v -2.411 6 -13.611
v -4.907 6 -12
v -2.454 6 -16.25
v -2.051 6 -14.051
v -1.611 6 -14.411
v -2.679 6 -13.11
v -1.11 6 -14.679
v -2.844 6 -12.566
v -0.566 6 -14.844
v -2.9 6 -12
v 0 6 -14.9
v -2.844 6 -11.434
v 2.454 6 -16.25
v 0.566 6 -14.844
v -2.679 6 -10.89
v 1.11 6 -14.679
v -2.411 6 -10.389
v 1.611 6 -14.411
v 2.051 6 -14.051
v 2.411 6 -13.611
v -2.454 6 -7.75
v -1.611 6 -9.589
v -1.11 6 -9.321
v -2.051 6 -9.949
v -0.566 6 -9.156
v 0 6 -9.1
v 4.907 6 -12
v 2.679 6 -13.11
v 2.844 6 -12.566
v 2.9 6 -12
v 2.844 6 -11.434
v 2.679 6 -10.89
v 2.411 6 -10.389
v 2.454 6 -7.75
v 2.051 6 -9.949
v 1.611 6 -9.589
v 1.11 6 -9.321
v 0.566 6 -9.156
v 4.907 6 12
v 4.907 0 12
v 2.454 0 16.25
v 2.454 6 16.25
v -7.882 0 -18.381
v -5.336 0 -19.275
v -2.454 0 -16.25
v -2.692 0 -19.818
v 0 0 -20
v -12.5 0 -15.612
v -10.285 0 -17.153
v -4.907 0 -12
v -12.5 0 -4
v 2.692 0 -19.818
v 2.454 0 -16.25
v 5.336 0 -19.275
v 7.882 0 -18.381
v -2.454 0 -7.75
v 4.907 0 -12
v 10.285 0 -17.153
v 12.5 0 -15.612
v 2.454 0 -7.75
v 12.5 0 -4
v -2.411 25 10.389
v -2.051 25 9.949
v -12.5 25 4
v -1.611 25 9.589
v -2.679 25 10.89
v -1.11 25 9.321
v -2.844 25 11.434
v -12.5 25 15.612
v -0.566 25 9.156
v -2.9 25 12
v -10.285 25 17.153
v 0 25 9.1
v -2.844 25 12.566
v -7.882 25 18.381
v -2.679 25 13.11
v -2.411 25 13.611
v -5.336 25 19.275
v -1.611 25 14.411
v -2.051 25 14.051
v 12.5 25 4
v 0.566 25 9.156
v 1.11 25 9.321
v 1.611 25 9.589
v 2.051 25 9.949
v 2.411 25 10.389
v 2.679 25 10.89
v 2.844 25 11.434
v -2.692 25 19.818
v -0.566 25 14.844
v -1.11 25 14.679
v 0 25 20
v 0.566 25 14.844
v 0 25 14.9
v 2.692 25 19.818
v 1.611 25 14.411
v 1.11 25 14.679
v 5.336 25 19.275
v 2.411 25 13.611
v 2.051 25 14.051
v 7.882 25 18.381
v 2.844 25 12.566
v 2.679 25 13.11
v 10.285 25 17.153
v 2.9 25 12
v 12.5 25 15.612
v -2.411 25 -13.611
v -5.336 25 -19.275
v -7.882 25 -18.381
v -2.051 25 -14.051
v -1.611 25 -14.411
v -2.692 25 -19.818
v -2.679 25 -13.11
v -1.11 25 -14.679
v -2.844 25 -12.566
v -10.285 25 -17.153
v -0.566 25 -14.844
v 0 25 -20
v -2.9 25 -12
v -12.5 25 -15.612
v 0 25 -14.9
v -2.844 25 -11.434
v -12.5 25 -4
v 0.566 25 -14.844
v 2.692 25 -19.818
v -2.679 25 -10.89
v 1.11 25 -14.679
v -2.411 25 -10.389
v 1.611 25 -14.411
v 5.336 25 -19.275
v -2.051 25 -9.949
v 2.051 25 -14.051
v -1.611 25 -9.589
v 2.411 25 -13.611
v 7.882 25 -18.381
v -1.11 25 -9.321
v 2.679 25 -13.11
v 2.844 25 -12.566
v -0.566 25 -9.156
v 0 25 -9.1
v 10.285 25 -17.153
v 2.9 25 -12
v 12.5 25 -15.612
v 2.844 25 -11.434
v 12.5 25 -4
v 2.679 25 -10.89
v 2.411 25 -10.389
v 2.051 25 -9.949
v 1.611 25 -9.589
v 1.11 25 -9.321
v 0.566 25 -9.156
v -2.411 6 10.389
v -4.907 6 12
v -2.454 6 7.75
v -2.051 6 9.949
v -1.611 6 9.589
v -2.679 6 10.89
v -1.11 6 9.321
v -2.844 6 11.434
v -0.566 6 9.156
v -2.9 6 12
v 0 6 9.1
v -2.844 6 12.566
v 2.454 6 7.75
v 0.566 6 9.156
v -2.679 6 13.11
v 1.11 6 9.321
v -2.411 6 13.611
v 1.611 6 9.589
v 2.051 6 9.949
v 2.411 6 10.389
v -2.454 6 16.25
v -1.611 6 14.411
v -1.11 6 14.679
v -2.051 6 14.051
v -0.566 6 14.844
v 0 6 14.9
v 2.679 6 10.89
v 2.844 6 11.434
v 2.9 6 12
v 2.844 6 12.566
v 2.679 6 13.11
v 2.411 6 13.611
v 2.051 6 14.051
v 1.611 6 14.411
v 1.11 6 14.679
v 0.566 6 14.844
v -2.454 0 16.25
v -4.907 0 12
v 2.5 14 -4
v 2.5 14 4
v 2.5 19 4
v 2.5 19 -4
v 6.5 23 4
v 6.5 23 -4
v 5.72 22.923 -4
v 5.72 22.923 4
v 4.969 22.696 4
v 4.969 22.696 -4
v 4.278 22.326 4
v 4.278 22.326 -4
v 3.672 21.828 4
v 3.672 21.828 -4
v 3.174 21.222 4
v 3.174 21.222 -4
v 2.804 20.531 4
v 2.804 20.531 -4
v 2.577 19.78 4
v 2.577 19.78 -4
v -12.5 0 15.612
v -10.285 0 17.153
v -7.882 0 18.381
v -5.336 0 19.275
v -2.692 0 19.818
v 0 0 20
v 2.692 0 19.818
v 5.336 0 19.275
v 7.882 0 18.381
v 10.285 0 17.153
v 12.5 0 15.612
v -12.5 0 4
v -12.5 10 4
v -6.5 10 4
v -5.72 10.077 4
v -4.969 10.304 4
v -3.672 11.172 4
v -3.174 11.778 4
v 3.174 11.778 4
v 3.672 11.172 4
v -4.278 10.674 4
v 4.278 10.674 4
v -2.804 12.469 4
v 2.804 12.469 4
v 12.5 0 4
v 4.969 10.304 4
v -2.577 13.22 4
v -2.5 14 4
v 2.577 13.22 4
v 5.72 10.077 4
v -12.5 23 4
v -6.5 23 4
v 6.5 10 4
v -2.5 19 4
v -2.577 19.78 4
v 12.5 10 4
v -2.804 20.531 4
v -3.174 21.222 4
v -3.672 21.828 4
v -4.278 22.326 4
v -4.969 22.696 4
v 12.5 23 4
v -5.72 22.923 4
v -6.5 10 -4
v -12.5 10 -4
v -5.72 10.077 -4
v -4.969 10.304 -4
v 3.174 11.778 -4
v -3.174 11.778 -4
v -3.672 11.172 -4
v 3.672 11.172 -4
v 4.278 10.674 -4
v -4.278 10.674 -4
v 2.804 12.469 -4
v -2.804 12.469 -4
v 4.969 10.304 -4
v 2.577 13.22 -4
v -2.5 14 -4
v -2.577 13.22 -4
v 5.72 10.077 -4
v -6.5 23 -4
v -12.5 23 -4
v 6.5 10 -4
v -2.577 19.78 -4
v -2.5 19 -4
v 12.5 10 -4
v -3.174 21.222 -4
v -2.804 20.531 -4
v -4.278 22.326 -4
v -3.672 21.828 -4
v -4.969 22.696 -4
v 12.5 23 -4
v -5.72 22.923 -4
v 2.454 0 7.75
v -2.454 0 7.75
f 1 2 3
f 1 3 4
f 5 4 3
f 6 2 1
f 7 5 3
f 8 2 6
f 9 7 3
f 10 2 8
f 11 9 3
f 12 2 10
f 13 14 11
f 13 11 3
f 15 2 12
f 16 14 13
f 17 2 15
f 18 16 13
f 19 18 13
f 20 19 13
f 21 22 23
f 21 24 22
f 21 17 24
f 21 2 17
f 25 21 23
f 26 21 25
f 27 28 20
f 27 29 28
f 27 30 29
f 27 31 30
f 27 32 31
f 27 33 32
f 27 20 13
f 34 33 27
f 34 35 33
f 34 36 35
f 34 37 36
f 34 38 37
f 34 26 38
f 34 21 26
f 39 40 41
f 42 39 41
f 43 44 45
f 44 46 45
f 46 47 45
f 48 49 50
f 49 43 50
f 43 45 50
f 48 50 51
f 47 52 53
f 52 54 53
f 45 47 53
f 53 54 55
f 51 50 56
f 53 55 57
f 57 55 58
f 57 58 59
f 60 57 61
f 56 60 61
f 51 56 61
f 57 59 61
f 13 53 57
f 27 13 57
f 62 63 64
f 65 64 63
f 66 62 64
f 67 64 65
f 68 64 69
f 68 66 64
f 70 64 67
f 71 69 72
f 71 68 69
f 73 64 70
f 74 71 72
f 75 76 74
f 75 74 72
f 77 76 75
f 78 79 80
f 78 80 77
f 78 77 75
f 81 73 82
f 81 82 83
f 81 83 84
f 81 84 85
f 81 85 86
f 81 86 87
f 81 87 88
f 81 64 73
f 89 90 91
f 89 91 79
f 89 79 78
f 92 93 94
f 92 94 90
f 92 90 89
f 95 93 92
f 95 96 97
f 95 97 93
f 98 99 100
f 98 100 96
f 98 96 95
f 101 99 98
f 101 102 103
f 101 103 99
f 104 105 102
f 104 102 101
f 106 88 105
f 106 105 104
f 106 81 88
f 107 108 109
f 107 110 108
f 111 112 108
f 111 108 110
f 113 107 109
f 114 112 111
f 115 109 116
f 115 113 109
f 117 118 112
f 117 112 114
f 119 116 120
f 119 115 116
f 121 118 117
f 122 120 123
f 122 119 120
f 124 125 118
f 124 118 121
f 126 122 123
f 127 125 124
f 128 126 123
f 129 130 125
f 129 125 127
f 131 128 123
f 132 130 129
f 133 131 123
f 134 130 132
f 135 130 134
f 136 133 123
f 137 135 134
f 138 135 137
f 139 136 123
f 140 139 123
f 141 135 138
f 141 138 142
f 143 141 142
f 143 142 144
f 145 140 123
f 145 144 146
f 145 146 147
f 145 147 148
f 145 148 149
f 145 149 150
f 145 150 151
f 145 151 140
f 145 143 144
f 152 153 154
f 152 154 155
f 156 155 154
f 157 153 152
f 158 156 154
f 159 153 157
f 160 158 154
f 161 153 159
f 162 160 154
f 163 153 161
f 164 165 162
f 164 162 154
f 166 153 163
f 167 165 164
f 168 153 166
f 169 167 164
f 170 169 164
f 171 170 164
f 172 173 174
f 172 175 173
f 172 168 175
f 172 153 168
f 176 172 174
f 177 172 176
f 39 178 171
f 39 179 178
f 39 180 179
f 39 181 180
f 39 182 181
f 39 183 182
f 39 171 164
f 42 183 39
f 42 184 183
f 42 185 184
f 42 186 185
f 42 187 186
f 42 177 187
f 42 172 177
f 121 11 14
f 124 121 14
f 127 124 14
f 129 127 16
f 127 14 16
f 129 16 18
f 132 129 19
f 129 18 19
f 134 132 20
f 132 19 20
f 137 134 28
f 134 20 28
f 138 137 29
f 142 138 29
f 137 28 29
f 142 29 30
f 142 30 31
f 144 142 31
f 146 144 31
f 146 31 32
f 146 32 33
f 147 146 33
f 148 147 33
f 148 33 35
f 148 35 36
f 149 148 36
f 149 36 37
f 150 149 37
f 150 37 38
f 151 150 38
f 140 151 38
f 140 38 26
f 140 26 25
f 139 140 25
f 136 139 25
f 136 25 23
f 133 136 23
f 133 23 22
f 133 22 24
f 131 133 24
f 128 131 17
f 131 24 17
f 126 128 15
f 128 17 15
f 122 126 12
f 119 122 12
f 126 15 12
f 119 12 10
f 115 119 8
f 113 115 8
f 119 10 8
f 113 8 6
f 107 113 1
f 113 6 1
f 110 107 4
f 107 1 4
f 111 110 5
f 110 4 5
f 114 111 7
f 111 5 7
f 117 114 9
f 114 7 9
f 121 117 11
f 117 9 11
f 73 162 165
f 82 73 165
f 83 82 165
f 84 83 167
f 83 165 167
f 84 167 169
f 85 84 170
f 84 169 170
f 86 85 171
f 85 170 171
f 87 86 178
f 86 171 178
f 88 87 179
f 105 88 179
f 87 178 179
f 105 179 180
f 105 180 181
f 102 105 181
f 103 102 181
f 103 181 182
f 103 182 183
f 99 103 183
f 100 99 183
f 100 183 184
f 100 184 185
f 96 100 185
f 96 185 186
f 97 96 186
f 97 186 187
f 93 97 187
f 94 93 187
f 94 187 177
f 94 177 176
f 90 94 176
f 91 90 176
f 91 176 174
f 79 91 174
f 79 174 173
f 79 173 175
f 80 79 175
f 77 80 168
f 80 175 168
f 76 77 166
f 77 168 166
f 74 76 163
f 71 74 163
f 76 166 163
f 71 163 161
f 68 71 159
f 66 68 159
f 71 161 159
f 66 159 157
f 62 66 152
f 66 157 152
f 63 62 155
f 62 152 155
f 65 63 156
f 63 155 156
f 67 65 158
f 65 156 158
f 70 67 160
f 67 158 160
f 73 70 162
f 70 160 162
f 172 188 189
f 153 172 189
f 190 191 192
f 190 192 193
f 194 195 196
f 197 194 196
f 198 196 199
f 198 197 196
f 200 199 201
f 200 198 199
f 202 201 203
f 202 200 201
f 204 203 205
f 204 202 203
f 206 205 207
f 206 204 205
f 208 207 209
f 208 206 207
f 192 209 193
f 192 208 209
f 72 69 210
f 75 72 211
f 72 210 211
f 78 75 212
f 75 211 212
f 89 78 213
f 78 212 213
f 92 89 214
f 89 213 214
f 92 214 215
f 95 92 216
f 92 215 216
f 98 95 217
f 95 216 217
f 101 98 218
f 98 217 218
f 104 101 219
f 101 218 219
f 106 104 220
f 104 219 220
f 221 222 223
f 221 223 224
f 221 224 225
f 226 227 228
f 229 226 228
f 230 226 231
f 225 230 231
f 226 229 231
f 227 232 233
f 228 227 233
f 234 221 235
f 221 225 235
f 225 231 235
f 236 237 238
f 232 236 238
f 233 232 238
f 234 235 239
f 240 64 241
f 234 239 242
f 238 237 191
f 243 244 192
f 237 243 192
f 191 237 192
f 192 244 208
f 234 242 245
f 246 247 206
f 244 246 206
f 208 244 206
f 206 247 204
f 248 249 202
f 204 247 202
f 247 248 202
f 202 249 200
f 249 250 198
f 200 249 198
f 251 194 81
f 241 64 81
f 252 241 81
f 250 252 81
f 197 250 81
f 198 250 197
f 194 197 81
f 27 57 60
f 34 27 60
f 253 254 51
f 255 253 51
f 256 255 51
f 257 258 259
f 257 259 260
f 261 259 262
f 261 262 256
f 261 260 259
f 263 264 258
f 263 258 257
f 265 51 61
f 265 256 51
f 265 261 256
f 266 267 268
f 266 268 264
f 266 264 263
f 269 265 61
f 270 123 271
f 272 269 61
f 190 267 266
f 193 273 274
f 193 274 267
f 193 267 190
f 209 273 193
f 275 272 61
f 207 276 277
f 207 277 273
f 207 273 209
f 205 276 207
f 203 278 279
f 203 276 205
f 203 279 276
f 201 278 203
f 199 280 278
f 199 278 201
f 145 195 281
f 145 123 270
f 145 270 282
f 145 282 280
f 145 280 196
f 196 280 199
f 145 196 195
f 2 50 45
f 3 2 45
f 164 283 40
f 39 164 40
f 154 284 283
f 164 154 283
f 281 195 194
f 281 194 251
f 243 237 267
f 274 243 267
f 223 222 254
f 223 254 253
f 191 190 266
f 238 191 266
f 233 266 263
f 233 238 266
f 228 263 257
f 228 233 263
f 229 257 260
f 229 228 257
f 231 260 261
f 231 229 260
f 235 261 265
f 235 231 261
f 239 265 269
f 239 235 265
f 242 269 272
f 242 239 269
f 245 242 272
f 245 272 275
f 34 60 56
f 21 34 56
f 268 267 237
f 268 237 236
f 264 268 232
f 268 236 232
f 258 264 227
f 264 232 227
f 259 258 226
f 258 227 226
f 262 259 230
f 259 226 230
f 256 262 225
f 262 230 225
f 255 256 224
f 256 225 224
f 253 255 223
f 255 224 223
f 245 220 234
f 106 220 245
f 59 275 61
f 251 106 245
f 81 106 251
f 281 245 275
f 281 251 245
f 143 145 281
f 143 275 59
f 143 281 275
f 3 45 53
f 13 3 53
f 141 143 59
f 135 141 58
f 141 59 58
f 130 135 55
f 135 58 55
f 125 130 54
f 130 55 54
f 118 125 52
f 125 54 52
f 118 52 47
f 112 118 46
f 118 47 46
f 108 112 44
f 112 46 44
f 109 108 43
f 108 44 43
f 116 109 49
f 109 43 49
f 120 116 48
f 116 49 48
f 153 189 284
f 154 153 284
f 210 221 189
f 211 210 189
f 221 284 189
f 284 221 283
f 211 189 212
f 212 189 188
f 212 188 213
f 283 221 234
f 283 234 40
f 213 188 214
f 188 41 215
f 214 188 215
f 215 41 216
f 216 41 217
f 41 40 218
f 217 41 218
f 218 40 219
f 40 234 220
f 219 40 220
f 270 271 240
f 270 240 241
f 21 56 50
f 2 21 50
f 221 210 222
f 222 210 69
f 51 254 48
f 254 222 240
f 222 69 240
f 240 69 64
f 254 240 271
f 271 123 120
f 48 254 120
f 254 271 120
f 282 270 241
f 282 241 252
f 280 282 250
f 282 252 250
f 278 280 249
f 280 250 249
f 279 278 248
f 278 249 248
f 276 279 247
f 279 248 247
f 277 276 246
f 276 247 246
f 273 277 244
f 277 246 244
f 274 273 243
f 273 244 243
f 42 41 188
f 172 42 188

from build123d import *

# Parameters (mm, degrees)
SKETCH1_R               = 20
BOSS_EXTRUDE1_DEPTH     = 25
SKETCH2_W               = 40
SKETCH2_H               = 8
CUT_EXTRUDE1_DEPTH      = 2
M5_CLEARANCE_HOLE1_D    = 5.8
CUT_EXTRUDE2_DEPTH      = 6
CUT_EXTRUDE3_DEPTH      = 37.455452267
CUT_EXTRUDE3_DEPTH_BACK = 37.455452267
SKETCH6_W               = 5
SKETCH6_H               = 8
SKETCH7_W               = 40
SKETCH7_H               = 8
CUT_EXTRUDE4_DEPTH      = 10
FILLET1_R               = 4
SKETCH8_OUTSIDE_W       = 54.37
SKETCH8_OUTSIDE_H       = 54.37
SKETCH8_OUTSIDE_W_2     = 25
SKETCH8_OUTSIDE_H_2     = 40
CUT_EXTRUDE5_DEPTH      = 38.749172176


with BuildPart() as part:
    # Sketch1 → Boss-Extrude1 (new body)
    with BuildSketch(Plane(origin=(0, 0, 0), x_dir=(1, 0, 0), z_dir=(0, 1, 0))):
        with Locations(Location((0, 0, 0), (0, 0, 270))):
            Circle(SKETCH1_R)
    extrude(amount=BOSS_EXTRUDE1_DEPTH)

    # Sketch2 → Cut-Extrude1 (cut)
    with BuildSketch(Plane(origin=(0, 25, 0), x_dir=(1, 0, 0), z_dir=(0, 1, 0))):
        Rectangle(SKETCH2_W, SKETCH2_H)
    extrude(amount=-CUT_EXTRUDE1_DEPTH, mode=Mode.SUBTRACT)

    # M5 Clearance Hole1 (through all)
    with Locations(Plane(origin=(0, 25, -12), x_dir=(0, 0, 1), z_dir=(0, 1, 0))):
        with Locations((0, 0), (24, 0)):
            Hole(M5_CLEARANCE_HOLE1_D / 2)

    # Sketch5 → Cut-Extrude2 (cut)
    with BuildSketch(Plane.XZ):
        Polygon((4.907477288, 12), (2.453738644, 16.25), (-2.453738644, 16.25), (-4.907477288, 12), (-2.453738644, 7.75), (2.453738644, 7.75), align=None)
        Polygon((4.907477288, -12), (2.453738644, -7.75), (-2.453738644, -7.75), (-4.907477288, -12), (-2.453738644, -16.25), (2.453738644, -16.25), align=None)
    extrude(amount=-CUT_EXTRUDE2_DEPTH, mode=Mode.SUBTRACT)

    # Sketch6 → Cut-Extrude3 (cut, two sides: drawn at the far end of the back side and taken through both)
    with BuildSketch(Plane(origin=(0, 23, 0), x_dir=(1, 0, 0), z_dir=(0, 1, 0)).offset(-CUT_EXTRUDE3_DEPTH_BACK)):
        Rectangle(SKETCH6_W, SKETCH6_H)
    extrude(amount=CUT_EXTRUDE3_DEPTH + CUT_EXTRUDE3_DEPTH_BACK, mode=Mode.SUBTRACT)

    # Sketch7 → Cut-Extrude4 (cut)
    with BuildSketch(Plane.XZ):
        Rectangle(SKETCH7_W, SKETCH7_H)
    extrude(amount=-CUT_EXTRUDE4_DEPTH, mode=Mode.SUBTRACT)

    # Fillet1
    fillet1_edges = [part.edges().sort_by_distance(p)[0] for p in [
        (2.5, 10, 0),
        (-2.5, 10, 0),
        (-2.5, 23, 0),
        (2.5, 23, 0),
    ]]
    fillet(fillet1_edges, radius=FILLET1_R)

    # Sketch8 outside → Cut-Extrude5 (cut, through all)
    with BuildSketch(Plane(origin=(0, 25, 0), x_dir=(1, 0, 0), z_dir=(0, 1, 0))):
        Rectangle(SKETCH8_OUTSIDE_W, SKETCH8_OUTSIDE_H)
        Rectangle(SKETCH8_OUTSIDE_W_2, SKETCH8_OUTSIDE_H_2, mode=Mode.SUBTRACT)
    extrude(amount=-CUT_EXTRUDE5_DEPTH, mode=Mode.SUBTRACT)


solid = part.part
